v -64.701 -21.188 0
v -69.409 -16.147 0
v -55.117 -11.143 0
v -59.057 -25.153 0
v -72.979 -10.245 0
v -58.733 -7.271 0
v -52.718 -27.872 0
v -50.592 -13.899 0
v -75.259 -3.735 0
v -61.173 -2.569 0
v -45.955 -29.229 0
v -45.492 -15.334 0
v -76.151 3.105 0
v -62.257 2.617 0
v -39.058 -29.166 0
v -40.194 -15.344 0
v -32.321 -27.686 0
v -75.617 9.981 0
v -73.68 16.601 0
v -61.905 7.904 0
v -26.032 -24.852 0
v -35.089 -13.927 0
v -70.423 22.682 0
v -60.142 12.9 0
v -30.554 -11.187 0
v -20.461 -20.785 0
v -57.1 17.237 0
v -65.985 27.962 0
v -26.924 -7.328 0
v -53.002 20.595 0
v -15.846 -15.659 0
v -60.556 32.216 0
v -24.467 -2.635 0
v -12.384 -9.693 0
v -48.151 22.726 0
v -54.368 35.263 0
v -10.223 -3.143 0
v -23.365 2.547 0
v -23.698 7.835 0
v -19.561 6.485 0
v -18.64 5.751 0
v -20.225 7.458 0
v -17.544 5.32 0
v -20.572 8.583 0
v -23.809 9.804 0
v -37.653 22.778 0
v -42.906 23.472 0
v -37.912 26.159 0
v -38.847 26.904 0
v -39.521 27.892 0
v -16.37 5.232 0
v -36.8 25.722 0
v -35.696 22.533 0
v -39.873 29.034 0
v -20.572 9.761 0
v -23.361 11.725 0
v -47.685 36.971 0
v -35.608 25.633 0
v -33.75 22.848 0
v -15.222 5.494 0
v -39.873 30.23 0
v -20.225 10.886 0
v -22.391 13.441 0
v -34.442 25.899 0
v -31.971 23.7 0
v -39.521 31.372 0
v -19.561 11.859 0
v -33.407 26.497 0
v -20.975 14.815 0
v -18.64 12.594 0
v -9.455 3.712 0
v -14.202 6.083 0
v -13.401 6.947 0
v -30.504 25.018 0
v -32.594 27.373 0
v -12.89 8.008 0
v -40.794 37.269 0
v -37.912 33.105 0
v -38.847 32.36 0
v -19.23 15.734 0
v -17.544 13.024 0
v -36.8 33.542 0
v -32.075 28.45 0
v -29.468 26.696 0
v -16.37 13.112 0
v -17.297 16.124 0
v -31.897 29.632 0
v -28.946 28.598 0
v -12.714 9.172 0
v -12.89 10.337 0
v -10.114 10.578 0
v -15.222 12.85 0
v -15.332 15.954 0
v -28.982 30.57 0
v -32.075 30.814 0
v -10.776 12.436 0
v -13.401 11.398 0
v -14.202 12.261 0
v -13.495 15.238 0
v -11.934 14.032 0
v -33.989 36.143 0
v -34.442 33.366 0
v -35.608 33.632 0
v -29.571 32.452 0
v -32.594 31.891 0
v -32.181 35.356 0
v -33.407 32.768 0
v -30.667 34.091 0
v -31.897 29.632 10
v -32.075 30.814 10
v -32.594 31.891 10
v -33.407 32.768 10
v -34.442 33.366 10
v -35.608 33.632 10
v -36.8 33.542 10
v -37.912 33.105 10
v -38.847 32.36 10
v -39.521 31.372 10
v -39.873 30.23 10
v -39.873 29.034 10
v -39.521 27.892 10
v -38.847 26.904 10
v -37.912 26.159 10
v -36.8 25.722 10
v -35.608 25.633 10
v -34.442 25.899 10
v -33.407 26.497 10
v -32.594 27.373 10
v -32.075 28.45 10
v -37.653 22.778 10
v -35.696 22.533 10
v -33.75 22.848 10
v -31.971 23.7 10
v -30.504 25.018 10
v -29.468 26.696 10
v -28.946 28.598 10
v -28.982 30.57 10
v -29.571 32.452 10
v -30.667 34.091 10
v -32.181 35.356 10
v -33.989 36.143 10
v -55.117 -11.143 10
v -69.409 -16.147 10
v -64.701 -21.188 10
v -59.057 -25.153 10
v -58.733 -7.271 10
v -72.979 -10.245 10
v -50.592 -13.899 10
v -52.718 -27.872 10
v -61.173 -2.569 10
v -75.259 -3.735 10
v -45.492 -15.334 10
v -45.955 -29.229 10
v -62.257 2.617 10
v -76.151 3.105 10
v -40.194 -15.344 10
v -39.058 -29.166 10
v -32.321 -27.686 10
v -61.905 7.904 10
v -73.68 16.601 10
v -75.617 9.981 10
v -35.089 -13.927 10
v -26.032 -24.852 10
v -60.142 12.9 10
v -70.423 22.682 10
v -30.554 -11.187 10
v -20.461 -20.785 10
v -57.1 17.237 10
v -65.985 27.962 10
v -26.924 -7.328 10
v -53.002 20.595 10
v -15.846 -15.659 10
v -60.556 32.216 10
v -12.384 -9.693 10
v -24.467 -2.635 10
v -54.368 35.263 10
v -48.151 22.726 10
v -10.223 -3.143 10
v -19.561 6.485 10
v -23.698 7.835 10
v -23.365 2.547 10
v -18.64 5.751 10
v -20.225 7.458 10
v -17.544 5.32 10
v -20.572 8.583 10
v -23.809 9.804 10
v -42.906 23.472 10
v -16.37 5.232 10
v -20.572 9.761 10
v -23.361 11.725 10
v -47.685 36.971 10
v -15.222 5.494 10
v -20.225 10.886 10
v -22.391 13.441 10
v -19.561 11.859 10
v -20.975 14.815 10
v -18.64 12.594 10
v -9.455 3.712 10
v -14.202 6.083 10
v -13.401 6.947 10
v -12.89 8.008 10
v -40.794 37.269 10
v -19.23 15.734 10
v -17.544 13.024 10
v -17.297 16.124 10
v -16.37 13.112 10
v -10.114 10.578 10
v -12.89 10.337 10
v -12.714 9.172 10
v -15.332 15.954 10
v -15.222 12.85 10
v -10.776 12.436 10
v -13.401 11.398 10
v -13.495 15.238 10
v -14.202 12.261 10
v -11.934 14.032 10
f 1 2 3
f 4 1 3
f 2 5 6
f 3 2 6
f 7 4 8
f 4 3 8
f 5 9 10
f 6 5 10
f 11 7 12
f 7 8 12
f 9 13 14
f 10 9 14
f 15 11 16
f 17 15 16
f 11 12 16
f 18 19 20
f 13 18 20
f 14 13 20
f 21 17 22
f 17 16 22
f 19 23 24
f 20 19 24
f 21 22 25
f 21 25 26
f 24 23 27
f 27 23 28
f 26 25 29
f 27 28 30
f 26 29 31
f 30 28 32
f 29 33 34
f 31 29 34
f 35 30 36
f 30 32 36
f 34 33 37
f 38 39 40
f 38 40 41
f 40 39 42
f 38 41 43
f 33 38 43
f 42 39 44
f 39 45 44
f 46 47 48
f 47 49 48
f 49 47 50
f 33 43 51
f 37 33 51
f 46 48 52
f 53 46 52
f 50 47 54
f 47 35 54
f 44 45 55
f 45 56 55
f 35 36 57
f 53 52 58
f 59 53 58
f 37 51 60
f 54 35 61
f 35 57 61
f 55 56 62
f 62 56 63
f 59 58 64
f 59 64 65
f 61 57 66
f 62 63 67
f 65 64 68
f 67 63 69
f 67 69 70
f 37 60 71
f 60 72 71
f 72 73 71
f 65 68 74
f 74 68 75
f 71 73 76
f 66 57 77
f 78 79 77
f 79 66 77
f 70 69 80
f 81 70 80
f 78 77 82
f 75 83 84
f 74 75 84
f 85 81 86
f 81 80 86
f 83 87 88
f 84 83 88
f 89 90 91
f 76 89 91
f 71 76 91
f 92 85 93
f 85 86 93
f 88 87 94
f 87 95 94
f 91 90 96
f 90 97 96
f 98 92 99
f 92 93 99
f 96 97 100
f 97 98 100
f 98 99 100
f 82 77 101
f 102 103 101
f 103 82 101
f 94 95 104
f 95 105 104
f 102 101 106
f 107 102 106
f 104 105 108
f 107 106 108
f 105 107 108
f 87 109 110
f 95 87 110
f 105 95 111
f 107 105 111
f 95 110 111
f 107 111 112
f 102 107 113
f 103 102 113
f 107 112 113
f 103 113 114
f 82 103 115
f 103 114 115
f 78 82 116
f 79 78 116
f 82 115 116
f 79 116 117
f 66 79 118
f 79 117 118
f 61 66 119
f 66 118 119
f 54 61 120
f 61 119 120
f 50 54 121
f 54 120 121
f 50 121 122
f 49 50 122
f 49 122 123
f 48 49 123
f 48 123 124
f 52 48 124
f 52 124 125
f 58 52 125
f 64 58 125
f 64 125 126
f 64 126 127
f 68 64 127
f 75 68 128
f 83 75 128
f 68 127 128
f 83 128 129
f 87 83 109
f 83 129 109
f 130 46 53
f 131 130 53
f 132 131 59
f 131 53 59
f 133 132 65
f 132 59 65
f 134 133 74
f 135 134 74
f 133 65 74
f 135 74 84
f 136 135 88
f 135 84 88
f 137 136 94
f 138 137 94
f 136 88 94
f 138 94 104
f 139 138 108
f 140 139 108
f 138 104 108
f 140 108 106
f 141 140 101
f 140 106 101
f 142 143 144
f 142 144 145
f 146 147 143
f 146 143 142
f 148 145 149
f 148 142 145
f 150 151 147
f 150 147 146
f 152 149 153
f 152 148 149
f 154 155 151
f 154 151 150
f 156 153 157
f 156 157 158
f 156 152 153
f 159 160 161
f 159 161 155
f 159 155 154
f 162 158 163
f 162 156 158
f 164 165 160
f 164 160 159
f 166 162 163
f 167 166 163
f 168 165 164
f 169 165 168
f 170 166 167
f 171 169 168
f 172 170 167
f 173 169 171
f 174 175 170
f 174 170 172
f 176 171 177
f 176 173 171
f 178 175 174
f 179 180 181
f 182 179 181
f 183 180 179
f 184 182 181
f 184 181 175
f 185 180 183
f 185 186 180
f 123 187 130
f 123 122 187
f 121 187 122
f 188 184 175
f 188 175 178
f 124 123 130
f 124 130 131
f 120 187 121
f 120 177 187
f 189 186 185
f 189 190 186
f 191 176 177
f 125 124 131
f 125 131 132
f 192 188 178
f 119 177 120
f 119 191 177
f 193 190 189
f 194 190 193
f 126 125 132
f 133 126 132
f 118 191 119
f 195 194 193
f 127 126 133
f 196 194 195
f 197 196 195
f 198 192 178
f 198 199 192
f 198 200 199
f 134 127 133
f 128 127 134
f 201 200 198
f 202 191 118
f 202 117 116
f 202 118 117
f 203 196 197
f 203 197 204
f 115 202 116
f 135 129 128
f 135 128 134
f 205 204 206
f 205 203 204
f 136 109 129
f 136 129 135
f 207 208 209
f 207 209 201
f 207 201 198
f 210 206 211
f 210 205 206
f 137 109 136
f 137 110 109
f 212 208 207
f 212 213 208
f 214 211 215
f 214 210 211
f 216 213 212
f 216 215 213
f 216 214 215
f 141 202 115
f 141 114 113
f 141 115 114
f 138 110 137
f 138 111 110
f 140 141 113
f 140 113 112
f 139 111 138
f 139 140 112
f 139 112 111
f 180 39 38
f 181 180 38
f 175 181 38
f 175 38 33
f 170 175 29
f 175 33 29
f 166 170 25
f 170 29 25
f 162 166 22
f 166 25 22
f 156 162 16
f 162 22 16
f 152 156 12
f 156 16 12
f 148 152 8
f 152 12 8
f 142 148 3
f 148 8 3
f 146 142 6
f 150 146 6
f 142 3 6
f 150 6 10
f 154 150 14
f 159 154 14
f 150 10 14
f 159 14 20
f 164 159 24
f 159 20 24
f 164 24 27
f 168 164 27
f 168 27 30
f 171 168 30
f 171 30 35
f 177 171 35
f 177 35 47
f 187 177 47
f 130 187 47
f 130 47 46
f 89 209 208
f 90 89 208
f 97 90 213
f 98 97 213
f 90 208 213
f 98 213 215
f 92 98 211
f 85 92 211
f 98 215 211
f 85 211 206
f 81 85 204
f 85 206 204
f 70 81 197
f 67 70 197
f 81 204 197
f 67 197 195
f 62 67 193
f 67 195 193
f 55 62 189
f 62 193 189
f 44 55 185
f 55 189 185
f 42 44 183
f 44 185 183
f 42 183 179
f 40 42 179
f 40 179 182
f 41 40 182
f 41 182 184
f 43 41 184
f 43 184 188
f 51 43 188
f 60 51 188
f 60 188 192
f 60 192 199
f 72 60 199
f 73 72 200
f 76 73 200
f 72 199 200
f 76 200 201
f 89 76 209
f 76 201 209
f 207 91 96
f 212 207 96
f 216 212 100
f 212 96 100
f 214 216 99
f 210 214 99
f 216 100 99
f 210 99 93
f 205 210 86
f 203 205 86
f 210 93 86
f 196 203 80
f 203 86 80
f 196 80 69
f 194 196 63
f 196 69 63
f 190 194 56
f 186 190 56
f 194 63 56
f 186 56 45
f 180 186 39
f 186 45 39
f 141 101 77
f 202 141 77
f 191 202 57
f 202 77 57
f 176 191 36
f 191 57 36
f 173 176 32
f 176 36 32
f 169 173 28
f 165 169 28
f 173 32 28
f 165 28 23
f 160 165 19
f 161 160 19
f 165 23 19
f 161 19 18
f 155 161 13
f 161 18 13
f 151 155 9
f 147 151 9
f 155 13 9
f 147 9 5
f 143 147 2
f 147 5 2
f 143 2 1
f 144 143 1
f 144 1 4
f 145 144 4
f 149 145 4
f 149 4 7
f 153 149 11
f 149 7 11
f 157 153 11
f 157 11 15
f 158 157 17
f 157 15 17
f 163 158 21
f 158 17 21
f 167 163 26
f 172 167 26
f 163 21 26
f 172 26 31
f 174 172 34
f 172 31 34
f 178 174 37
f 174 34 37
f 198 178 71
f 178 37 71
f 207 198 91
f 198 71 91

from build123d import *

# Parameters (mm, degrees)
BOSS_EXTRUDE1_DEPTH = 10
SKETCH2_R           = 4.010526774
SKETCH2_R_2         = 3.950911994
CUT_EXTRUDE2_DEPTH  = 10


with BuildPart() as part:
    # Sketch1 → Boss-Extrude1 (new body)
    with BuildSketch(Plane.XY):
        with BuildLine():
            ThreePointArc((-33.989040517, 36.142816718), (-67.185323929, -18.789245764), (-10.11434169, 10.577873726))
            ThreePointArc((-10.11434169, 10.577873726), (-18.277756389, 15.998303864), (-23.698186527, 7.834889164))
            ThreePointArc((-23.698186527, 7.834889164), (-57.057127067, -9.330681752), (-37.653346002, 22.778024532))
            ThreePointArc((-37.653346002, 22.778024532), (-29.138797167, 27.628267882), (-33.989040517, 36.142816718))
        make_face()
    extrude(amount=BOSS_EXTRUDE1_DEPTH)

    # Sketch2 → Cut-Extrude2 (cut)
    with BuildSketch(Plane.XY.offset(10)):
        with Locations((-35.907207797, 29.632235542)):
            Circle(SKETCH2_R)
        with Locations((-16.665002101, 9.172168726)):
            Circle(SKETCH2_R_2)
    extrude(amount=-CUT_EXTRUDE2_DEPTH, mode=Mode.SUBTRACT)


solid = part.part
